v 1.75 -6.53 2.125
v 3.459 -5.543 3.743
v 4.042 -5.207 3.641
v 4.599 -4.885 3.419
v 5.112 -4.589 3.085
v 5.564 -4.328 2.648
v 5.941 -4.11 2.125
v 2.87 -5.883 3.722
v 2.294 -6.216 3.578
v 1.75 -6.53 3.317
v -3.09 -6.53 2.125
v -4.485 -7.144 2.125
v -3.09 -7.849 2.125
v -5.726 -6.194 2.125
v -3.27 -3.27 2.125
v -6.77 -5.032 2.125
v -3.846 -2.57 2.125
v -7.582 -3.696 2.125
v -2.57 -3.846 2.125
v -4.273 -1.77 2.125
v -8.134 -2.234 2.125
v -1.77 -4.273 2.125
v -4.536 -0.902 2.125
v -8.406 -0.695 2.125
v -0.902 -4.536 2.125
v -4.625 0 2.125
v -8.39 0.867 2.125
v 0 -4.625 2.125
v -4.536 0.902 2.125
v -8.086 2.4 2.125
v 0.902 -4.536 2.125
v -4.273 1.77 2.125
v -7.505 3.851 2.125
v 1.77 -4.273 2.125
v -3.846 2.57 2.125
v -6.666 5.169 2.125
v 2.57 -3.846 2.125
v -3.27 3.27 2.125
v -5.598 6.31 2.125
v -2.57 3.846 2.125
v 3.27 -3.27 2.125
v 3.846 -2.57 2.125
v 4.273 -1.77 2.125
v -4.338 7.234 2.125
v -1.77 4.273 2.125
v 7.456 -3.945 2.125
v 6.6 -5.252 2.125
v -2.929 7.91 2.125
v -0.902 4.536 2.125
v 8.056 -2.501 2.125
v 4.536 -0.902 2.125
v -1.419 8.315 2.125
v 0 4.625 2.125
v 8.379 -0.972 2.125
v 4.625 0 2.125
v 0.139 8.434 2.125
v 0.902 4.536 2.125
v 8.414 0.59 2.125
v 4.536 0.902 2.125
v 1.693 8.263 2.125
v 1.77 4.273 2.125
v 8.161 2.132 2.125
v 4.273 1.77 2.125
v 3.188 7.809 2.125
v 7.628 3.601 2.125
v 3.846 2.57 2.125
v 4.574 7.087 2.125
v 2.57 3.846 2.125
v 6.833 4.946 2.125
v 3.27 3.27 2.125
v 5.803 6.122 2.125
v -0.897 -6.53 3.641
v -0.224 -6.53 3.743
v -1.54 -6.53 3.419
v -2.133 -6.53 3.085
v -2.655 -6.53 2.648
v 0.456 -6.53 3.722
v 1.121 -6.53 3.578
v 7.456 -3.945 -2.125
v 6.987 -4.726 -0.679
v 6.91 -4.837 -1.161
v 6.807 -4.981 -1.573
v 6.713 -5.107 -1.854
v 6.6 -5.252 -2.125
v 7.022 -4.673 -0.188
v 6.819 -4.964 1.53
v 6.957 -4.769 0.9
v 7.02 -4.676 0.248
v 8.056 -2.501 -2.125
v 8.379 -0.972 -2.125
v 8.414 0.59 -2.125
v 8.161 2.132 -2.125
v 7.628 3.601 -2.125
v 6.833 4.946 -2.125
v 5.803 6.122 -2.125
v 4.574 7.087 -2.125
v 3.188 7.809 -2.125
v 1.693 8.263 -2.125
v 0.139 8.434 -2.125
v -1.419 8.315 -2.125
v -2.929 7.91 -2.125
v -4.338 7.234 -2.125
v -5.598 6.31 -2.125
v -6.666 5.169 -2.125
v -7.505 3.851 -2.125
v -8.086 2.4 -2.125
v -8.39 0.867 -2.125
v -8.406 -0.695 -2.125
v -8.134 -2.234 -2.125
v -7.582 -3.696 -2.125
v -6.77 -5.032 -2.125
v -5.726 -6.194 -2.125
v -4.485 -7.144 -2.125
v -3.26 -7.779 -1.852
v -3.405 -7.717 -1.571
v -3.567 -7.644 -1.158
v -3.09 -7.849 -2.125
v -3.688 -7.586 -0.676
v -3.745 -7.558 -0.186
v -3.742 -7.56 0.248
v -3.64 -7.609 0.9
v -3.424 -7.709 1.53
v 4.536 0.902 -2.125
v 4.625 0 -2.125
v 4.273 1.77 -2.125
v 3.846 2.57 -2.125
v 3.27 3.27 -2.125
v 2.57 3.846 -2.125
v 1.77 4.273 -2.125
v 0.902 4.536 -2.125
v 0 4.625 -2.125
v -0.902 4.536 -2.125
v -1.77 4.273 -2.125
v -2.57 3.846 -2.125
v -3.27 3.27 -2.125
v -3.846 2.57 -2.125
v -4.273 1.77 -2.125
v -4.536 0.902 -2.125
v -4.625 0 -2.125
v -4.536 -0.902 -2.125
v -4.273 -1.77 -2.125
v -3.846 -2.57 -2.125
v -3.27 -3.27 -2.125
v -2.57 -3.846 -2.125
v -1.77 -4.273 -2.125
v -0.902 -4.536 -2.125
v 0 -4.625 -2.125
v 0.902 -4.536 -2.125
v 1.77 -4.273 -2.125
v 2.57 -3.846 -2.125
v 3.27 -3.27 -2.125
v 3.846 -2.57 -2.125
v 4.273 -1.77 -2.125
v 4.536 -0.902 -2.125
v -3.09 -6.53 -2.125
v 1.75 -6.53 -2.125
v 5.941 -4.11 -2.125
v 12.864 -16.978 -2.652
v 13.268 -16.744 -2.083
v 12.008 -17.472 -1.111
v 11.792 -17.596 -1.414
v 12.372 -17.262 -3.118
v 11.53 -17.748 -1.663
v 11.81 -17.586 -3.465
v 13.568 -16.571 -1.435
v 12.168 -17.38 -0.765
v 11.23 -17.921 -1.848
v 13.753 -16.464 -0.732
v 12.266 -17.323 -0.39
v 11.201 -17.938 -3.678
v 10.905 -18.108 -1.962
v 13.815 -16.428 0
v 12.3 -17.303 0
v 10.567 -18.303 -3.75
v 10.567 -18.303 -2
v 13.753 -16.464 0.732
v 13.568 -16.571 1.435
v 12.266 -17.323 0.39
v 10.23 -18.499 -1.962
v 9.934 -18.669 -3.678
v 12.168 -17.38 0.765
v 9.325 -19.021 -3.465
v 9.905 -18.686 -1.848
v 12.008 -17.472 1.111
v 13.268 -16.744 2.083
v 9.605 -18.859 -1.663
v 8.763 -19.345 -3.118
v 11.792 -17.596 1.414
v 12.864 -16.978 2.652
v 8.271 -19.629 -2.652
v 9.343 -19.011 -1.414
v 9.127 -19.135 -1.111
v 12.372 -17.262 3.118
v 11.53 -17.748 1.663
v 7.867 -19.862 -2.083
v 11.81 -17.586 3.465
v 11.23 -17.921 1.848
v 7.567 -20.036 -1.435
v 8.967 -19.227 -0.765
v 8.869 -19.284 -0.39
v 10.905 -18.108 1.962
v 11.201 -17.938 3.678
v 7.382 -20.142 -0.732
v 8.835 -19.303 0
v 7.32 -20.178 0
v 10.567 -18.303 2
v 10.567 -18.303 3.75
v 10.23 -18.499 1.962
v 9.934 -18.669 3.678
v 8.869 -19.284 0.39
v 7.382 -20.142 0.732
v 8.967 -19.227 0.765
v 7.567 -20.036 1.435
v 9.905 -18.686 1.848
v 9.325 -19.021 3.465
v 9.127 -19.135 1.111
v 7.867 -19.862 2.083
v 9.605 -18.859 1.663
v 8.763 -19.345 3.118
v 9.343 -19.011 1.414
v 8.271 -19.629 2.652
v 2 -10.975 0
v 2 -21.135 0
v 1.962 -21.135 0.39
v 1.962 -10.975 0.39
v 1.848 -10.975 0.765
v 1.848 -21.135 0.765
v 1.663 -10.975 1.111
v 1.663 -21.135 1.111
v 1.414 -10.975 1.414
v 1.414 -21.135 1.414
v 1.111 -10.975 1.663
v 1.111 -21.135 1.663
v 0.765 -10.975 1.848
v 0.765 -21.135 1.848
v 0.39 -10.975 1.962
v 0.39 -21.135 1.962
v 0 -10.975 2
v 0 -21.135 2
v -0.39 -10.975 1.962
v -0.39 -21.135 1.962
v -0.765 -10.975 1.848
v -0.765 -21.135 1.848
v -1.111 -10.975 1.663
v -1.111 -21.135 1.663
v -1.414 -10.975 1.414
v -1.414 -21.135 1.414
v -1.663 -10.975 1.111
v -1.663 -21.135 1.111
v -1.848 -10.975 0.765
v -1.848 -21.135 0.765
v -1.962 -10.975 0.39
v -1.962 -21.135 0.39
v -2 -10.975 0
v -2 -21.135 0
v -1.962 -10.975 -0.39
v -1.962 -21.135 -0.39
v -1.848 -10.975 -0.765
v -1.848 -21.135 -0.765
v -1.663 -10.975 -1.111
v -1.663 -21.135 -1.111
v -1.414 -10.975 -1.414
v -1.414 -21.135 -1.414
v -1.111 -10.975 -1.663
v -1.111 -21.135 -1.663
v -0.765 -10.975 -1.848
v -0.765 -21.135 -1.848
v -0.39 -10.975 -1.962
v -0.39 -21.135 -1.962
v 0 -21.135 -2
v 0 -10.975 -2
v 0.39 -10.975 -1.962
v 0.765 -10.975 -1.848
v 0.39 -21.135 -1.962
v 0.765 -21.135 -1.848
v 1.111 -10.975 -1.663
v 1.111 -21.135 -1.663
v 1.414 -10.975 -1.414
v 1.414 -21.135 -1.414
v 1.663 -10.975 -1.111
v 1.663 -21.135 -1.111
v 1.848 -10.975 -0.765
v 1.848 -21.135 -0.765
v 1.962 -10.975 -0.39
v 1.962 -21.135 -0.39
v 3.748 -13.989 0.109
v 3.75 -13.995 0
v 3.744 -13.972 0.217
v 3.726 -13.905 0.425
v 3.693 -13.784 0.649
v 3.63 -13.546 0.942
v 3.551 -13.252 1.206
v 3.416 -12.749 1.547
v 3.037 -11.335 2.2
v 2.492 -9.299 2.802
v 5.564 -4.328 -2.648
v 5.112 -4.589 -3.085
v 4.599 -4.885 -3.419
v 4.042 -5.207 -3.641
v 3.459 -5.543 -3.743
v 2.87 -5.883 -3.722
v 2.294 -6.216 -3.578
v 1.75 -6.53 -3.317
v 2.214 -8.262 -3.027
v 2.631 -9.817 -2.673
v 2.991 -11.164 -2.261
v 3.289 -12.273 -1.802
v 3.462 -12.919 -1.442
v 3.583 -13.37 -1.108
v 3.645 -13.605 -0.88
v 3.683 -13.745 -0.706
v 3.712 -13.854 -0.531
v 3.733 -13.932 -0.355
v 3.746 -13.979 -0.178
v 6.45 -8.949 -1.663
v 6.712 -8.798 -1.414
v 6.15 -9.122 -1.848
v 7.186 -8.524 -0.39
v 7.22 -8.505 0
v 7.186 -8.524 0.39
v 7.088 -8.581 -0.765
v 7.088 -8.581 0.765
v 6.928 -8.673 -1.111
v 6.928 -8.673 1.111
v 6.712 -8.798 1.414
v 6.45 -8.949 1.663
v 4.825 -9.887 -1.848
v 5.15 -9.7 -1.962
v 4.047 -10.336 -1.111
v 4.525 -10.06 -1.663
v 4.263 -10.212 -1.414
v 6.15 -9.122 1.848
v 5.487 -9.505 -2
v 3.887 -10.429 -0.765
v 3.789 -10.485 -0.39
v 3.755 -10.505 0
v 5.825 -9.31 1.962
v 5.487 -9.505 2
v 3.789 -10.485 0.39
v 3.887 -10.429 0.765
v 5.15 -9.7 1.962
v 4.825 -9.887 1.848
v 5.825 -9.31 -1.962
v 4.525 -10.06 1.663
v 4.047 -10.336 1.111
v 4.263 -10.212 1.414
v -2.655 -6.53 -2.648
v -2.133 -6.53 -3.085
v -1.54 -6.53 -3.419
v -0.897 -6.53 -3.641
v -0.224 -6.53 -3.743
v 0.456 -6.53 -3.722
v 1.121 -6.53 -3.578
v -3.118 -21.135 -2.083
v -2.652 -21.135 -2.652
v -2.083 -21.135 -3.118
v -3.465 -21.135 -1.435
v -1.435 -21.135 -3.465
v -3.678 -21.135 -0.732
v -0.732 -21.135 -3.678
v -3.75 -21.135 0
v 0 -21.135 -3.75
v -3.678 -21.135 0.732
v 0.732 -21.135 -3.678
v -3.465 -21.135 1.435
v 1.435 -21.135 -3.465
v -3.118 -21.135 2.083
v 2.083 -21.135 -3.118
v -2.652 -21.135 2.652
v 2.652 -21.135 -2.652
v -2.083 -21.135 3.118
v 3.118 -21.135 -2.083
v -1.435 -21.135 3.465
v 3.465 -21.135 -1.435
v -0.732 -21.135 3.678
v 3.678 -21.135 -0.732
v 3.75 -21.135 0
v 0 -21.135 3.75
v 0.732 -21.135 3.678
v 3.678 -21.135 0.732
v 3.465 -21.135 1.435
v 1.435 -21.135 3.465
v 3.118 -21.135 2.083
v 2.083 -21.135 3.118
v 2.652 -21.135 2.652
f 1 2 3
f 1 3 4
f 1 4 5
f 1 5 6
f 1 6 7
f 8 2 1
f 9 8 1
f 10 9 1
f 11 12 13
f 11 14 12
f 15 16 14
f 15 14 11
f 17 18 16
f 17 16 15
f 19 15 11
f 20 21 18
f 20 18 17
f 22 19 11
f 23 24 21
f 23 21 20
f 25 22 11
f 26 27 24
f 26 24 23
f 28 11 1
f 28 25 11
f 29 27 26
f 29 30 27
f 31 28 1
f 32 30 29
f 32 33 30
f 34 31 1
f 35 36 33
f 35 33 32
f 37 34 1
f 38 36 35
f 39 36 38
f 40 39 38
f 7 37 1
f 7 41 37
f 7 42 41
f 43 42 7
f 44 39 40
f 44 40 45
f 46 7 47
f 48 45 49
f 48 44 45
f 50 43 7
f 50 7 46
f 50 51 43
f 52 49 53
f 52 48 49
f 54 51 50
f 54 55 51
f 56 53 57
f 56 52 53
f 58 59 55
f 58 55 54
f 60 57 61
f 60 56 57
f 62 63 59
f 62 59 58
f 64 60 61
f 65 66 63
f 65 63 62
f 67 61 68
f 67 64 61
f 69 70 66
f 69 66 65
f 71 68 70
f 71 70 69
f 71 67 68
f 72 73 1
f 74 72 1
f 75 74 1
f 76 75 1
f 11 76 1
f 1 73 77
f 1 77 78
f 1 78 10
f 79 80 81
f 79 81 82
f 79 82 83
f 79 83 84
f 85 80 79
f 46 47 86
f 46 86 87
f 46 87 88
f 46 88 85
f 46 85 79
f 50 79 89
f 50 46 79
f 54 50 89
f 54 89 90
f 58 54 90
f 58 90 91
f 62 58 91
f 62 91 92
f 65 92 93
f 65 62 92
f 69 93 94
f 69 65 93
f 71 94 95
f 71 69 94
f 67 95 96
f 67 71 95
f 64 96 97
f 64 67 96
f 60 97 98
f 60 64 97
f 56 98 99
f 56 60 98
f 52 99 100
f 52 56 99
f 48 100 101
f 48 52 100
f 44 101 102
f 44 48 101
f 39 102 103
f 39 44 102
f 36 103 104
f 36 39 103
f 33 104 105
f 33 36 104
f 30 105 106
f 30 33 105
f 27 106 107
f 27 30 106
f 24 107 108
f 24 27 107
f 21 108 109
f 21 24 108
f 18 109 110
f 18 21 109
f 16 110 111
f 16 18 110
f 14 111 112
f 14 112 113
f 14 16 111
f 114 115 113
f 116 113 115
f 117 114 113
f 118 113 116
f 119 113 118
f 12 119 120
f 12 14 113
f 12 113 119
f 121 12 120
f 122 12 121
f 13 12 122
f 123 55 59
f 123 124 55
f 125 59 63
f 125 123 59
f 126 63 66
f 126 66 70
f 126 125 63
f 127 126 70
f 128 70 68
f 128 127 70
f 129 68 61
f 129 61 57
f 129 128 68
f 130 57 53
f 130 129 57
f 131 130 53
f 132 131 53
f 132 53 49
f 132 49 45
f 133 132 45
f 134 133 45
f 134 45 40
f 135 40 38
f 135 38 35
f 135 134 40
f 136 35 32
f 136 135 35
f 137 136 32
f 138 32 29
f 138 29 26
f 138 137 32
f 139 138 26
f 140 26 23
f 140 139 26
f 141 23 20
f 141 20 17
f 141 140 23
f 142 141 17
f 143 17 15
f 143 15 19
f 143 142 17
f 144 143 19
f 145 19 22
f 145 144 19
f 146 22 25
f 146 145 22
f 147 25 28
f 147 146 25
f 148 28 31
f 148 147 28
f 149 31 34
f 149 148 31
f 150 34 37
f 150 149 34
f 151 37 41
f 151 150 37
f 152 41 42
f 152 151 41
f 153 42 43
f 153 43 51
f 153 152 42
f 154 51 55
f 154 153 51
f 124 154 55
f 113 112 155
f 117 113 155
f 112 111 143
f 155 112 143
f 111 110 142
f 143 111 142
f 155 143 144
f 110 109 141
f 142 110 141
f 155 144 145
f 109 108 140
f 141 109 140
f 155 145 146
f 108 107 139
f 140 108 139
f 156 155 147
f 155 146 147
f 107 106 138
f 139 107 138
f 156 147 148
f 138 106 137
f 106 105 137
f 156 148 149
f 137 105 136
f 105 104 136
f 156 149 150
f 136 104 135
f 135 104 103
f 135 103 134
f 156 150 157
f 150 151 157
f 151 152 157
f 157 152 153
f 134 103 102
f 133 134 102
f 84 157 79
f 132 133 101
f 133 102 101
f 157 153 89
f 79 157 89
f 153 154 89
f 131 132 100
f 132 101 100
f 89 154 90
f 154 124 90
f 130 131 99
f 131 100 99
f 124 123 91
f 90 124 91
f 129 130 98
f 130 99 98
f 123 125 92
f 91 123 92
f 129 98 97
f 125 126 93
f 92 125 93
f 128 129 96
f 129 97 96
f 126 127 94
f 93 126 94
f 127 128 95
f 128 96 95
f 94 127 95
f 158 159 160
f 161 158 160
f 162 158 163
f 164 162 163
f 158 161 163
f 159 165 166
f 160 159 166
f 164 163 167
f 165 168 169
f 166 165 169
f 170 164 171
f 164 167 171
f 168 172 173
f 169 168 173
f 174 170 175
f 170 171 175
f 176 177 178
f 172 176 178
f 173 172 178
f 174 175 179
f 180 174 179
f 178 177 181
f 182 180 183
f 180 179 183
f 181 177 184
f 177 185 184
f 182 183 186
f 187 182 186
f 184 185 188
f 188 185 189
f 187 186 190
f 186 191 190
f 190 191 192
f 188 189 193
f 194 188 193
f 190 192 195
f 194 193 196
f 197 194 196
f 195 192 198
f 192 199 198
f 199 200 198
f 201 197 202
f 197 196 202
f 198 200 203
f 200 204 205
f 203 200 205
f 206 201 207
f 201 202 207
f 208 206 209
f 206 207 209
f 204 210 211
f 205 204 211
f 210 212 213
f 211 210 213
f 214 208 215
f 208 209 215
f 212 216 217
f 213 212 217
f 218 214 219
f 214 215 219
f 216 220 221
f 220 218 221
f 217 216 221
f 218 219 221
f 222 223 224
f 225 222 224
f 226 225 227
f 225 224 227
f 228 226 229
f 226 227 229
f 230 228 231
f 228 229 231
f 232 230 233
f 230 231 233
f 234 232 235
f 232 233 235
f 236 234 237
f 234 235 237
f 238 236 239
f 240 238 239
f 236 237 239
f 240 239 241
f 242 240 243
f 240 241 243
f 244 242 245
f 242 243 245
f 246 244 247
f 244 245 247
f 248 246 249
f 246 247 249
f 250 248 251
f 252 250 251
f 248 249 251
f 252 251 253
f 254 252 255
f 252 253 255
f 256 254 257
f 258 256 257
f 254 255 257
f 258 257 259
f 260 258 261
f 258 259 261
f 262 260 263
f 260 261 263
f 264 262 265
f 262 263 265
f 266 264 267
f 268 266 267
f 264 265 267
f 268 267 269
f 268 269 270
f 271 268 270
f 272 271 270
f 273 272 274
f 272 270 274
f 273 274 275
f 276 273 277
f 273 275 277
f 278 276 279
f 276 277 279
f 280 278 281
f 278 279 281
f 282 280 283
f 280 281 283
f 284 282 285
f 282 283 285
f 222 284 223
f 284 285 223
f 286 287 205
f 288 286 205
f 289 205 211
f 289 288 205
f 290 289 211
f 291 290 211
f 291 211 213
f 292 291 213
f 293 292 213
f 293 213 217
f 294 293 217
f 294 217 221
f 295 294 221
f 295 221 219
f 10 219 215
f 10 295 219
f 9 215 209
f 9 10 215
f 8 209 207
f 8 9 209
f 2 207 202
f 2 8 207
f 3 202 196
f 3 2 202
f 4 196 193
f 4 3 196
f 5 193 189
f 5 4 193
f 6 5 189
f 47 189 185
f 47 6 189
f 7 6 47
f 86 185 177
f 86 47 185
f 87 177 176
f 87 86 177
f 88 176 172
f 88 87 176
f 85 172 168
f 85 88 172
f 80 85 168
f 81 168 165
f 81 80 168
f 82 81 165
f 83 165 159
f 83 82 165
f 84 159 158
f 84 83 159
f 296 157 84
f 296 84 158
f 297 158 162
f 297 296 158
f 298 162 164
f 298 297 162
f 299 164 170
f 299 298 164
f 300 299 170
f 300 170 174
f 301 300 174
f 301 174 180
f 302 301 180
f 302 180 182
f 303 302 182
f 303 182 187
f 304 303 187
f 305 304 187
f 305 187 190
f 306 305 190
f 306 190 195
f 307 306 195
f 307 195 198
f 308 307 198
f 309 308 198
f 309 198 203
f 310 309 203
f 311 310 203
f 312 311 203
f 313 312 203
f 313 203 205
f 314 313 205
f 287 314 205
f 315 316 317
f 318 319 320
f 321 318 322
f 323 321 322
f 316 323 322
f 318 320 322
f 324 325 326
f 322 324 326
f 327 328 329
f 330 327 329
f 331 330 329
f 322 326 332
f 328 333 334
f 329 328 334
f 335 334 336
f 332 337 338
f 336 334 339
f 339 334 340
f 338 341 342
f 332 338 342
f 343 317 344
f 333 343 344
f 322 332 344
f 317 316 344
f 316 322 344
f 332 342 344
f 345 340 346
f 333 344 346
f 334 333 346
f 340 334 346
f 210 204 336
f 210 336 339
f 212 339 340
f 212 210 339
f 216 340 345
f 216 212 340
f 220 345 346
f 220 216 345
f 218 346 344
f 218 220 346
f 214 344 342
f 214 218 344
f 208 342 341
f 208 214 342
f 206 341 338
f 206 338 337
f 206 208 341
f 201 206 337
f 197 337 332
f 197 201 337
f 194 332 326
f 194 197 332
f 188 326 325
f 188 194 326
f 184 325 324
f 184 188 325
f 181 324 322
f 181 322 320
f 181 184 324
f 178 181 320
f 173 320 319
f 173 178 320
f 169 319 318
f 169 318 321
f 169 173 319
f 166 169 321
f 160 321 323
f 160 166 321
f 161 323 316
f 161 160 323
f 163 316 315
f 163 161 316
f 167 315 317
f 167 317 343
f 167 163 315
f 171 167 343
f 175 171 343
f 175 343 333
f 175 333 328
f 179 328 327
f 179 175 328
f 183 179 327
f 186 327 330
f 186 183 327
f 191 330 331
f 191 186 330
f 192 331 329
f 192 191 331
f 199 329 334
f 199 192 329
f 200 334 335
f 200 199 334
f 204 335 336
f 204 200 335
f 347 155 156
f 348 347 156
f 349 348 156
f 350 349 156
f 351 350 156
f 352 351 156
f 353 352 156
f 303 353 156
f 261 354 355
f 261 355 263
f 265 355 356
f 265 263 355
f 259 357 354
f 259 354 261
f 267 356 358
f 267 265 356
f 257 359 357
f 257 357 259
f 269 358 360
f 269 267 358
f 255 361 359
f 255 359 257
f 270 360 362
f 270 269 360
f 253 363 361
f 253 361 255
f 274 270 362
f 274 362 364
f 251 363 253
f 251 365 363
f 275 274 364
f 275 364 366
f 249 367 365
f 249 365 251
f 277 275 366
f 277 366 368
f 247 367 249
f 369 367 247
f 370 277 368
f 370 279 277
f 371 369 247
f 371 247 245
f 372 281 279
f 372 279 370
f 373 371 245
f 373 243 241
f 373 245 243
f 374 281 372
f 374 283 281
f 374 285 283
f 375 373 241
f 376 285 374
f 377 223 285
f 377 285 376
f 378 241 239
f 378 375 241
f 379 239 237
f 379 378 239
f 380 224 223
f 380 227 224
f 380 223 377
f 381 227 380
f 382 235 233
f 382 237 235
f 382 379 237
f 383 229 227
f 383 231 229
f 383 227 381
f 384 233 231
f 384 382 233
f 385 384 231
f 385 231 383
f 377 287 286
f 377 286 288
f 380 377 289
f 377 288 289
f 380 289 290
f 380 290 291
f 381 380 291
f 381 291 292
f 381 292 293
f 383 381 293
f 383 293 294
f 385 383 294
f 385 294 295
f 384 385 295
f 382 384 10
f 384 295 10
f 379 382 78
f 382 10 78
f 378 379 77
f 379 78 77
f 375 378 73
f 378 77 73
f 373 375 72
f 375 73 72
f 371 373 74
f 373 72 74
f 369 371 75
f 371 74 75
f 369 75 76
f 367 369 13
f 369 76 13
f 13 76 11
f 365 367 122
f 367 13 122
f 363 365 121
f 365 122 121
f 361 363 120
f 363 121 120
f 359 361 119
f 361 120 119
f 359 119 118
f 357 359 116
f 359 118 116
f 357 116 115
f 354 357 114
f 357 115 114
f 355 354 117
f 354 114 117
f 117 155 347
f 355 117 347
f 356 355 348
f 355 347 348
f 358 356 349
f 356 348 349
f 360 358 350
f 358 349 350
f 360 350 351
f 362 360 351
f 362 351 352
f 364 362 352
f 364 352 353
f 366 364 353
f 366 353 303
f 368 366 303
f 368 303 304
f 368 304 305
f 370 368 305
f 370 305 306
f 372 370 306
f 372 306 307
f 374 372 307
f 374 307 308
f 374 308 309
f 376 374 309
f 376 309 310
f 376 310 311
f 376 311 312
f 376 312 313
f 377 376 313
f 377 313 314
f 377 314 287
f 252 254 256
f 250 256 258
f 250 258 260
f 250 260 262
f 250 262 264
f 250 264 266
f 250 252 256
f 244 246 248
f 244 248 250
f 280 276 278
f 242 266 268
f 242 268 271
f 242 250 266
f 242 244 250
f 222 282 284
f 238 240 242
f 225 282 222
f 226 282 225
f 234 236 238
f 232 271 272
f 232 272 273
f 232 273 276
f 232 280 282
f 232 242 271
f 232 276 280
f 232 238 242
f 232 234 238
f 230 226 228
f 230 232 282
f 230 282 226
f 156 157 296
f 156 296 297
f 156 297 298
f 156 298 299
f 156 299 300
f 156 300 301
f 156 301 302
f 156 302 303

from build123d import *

# Parameters (mm, degrees)
F0_R     = 8.435
F0_R_2   = 4.625
F1_DEPTH = 2.125
F3_R     = 3.75
F3_R_2   = 2
F4_DEPTH = 14.605
F5_R     = 2
F6_DEPTH = 10.16


# Not quite as in the source:
# - a pattern or mirror of a feature is missing from the dataset's text; its kind, count and spacing are read off the source's solid


with BuildPart() as f1:
    # F0 (on Top) → F1 (new body, symmetric)
    with BuildSketch(Plane.XY):
        Circle(F0_R)
        Circle(F0_R_2, mode=Mode.SUBTRACT)
    extrude(amount=F1_DEPTH, both=True)

    # F3 (on offset) → F4 (join)
    with BuildSketch(Plane.XZ.offset(6.53)):
        Circle(F3_R)
        Circle(F3_R_2, mode=Mode.SUBTRACT)
        Circle(F3_R_2)
    f4 = extrude(amount=F4_DEPTH)

    # F4_copies: F4 across plane
    add(f4.mirror(Plane(origin=(0, 0, 0), x_dir=(-0.2588190451, 0.9659258263, 0), z_dir=(0.9659258263, 0.2588190451, 0))))

    # F5 (on face) → F6 (cut)
    with BuildSketch(Plane.XZ.offset(21.135)):
        Circle(F5_R)
    f6 = extrude(amount=-F6_DEPTH, mode=Mode.SUBTRACT)

    # F6_copies: F6 across plane
    add(f6.mirror(Plane(origin=(0, 0, 0), x_dir=(-0.2588190451, 0.9659258263, 0), z_dir=(0.9659258263, 0.2588190451, 0))), mode=Mode.SUBTRACT)


solid = f1.part
